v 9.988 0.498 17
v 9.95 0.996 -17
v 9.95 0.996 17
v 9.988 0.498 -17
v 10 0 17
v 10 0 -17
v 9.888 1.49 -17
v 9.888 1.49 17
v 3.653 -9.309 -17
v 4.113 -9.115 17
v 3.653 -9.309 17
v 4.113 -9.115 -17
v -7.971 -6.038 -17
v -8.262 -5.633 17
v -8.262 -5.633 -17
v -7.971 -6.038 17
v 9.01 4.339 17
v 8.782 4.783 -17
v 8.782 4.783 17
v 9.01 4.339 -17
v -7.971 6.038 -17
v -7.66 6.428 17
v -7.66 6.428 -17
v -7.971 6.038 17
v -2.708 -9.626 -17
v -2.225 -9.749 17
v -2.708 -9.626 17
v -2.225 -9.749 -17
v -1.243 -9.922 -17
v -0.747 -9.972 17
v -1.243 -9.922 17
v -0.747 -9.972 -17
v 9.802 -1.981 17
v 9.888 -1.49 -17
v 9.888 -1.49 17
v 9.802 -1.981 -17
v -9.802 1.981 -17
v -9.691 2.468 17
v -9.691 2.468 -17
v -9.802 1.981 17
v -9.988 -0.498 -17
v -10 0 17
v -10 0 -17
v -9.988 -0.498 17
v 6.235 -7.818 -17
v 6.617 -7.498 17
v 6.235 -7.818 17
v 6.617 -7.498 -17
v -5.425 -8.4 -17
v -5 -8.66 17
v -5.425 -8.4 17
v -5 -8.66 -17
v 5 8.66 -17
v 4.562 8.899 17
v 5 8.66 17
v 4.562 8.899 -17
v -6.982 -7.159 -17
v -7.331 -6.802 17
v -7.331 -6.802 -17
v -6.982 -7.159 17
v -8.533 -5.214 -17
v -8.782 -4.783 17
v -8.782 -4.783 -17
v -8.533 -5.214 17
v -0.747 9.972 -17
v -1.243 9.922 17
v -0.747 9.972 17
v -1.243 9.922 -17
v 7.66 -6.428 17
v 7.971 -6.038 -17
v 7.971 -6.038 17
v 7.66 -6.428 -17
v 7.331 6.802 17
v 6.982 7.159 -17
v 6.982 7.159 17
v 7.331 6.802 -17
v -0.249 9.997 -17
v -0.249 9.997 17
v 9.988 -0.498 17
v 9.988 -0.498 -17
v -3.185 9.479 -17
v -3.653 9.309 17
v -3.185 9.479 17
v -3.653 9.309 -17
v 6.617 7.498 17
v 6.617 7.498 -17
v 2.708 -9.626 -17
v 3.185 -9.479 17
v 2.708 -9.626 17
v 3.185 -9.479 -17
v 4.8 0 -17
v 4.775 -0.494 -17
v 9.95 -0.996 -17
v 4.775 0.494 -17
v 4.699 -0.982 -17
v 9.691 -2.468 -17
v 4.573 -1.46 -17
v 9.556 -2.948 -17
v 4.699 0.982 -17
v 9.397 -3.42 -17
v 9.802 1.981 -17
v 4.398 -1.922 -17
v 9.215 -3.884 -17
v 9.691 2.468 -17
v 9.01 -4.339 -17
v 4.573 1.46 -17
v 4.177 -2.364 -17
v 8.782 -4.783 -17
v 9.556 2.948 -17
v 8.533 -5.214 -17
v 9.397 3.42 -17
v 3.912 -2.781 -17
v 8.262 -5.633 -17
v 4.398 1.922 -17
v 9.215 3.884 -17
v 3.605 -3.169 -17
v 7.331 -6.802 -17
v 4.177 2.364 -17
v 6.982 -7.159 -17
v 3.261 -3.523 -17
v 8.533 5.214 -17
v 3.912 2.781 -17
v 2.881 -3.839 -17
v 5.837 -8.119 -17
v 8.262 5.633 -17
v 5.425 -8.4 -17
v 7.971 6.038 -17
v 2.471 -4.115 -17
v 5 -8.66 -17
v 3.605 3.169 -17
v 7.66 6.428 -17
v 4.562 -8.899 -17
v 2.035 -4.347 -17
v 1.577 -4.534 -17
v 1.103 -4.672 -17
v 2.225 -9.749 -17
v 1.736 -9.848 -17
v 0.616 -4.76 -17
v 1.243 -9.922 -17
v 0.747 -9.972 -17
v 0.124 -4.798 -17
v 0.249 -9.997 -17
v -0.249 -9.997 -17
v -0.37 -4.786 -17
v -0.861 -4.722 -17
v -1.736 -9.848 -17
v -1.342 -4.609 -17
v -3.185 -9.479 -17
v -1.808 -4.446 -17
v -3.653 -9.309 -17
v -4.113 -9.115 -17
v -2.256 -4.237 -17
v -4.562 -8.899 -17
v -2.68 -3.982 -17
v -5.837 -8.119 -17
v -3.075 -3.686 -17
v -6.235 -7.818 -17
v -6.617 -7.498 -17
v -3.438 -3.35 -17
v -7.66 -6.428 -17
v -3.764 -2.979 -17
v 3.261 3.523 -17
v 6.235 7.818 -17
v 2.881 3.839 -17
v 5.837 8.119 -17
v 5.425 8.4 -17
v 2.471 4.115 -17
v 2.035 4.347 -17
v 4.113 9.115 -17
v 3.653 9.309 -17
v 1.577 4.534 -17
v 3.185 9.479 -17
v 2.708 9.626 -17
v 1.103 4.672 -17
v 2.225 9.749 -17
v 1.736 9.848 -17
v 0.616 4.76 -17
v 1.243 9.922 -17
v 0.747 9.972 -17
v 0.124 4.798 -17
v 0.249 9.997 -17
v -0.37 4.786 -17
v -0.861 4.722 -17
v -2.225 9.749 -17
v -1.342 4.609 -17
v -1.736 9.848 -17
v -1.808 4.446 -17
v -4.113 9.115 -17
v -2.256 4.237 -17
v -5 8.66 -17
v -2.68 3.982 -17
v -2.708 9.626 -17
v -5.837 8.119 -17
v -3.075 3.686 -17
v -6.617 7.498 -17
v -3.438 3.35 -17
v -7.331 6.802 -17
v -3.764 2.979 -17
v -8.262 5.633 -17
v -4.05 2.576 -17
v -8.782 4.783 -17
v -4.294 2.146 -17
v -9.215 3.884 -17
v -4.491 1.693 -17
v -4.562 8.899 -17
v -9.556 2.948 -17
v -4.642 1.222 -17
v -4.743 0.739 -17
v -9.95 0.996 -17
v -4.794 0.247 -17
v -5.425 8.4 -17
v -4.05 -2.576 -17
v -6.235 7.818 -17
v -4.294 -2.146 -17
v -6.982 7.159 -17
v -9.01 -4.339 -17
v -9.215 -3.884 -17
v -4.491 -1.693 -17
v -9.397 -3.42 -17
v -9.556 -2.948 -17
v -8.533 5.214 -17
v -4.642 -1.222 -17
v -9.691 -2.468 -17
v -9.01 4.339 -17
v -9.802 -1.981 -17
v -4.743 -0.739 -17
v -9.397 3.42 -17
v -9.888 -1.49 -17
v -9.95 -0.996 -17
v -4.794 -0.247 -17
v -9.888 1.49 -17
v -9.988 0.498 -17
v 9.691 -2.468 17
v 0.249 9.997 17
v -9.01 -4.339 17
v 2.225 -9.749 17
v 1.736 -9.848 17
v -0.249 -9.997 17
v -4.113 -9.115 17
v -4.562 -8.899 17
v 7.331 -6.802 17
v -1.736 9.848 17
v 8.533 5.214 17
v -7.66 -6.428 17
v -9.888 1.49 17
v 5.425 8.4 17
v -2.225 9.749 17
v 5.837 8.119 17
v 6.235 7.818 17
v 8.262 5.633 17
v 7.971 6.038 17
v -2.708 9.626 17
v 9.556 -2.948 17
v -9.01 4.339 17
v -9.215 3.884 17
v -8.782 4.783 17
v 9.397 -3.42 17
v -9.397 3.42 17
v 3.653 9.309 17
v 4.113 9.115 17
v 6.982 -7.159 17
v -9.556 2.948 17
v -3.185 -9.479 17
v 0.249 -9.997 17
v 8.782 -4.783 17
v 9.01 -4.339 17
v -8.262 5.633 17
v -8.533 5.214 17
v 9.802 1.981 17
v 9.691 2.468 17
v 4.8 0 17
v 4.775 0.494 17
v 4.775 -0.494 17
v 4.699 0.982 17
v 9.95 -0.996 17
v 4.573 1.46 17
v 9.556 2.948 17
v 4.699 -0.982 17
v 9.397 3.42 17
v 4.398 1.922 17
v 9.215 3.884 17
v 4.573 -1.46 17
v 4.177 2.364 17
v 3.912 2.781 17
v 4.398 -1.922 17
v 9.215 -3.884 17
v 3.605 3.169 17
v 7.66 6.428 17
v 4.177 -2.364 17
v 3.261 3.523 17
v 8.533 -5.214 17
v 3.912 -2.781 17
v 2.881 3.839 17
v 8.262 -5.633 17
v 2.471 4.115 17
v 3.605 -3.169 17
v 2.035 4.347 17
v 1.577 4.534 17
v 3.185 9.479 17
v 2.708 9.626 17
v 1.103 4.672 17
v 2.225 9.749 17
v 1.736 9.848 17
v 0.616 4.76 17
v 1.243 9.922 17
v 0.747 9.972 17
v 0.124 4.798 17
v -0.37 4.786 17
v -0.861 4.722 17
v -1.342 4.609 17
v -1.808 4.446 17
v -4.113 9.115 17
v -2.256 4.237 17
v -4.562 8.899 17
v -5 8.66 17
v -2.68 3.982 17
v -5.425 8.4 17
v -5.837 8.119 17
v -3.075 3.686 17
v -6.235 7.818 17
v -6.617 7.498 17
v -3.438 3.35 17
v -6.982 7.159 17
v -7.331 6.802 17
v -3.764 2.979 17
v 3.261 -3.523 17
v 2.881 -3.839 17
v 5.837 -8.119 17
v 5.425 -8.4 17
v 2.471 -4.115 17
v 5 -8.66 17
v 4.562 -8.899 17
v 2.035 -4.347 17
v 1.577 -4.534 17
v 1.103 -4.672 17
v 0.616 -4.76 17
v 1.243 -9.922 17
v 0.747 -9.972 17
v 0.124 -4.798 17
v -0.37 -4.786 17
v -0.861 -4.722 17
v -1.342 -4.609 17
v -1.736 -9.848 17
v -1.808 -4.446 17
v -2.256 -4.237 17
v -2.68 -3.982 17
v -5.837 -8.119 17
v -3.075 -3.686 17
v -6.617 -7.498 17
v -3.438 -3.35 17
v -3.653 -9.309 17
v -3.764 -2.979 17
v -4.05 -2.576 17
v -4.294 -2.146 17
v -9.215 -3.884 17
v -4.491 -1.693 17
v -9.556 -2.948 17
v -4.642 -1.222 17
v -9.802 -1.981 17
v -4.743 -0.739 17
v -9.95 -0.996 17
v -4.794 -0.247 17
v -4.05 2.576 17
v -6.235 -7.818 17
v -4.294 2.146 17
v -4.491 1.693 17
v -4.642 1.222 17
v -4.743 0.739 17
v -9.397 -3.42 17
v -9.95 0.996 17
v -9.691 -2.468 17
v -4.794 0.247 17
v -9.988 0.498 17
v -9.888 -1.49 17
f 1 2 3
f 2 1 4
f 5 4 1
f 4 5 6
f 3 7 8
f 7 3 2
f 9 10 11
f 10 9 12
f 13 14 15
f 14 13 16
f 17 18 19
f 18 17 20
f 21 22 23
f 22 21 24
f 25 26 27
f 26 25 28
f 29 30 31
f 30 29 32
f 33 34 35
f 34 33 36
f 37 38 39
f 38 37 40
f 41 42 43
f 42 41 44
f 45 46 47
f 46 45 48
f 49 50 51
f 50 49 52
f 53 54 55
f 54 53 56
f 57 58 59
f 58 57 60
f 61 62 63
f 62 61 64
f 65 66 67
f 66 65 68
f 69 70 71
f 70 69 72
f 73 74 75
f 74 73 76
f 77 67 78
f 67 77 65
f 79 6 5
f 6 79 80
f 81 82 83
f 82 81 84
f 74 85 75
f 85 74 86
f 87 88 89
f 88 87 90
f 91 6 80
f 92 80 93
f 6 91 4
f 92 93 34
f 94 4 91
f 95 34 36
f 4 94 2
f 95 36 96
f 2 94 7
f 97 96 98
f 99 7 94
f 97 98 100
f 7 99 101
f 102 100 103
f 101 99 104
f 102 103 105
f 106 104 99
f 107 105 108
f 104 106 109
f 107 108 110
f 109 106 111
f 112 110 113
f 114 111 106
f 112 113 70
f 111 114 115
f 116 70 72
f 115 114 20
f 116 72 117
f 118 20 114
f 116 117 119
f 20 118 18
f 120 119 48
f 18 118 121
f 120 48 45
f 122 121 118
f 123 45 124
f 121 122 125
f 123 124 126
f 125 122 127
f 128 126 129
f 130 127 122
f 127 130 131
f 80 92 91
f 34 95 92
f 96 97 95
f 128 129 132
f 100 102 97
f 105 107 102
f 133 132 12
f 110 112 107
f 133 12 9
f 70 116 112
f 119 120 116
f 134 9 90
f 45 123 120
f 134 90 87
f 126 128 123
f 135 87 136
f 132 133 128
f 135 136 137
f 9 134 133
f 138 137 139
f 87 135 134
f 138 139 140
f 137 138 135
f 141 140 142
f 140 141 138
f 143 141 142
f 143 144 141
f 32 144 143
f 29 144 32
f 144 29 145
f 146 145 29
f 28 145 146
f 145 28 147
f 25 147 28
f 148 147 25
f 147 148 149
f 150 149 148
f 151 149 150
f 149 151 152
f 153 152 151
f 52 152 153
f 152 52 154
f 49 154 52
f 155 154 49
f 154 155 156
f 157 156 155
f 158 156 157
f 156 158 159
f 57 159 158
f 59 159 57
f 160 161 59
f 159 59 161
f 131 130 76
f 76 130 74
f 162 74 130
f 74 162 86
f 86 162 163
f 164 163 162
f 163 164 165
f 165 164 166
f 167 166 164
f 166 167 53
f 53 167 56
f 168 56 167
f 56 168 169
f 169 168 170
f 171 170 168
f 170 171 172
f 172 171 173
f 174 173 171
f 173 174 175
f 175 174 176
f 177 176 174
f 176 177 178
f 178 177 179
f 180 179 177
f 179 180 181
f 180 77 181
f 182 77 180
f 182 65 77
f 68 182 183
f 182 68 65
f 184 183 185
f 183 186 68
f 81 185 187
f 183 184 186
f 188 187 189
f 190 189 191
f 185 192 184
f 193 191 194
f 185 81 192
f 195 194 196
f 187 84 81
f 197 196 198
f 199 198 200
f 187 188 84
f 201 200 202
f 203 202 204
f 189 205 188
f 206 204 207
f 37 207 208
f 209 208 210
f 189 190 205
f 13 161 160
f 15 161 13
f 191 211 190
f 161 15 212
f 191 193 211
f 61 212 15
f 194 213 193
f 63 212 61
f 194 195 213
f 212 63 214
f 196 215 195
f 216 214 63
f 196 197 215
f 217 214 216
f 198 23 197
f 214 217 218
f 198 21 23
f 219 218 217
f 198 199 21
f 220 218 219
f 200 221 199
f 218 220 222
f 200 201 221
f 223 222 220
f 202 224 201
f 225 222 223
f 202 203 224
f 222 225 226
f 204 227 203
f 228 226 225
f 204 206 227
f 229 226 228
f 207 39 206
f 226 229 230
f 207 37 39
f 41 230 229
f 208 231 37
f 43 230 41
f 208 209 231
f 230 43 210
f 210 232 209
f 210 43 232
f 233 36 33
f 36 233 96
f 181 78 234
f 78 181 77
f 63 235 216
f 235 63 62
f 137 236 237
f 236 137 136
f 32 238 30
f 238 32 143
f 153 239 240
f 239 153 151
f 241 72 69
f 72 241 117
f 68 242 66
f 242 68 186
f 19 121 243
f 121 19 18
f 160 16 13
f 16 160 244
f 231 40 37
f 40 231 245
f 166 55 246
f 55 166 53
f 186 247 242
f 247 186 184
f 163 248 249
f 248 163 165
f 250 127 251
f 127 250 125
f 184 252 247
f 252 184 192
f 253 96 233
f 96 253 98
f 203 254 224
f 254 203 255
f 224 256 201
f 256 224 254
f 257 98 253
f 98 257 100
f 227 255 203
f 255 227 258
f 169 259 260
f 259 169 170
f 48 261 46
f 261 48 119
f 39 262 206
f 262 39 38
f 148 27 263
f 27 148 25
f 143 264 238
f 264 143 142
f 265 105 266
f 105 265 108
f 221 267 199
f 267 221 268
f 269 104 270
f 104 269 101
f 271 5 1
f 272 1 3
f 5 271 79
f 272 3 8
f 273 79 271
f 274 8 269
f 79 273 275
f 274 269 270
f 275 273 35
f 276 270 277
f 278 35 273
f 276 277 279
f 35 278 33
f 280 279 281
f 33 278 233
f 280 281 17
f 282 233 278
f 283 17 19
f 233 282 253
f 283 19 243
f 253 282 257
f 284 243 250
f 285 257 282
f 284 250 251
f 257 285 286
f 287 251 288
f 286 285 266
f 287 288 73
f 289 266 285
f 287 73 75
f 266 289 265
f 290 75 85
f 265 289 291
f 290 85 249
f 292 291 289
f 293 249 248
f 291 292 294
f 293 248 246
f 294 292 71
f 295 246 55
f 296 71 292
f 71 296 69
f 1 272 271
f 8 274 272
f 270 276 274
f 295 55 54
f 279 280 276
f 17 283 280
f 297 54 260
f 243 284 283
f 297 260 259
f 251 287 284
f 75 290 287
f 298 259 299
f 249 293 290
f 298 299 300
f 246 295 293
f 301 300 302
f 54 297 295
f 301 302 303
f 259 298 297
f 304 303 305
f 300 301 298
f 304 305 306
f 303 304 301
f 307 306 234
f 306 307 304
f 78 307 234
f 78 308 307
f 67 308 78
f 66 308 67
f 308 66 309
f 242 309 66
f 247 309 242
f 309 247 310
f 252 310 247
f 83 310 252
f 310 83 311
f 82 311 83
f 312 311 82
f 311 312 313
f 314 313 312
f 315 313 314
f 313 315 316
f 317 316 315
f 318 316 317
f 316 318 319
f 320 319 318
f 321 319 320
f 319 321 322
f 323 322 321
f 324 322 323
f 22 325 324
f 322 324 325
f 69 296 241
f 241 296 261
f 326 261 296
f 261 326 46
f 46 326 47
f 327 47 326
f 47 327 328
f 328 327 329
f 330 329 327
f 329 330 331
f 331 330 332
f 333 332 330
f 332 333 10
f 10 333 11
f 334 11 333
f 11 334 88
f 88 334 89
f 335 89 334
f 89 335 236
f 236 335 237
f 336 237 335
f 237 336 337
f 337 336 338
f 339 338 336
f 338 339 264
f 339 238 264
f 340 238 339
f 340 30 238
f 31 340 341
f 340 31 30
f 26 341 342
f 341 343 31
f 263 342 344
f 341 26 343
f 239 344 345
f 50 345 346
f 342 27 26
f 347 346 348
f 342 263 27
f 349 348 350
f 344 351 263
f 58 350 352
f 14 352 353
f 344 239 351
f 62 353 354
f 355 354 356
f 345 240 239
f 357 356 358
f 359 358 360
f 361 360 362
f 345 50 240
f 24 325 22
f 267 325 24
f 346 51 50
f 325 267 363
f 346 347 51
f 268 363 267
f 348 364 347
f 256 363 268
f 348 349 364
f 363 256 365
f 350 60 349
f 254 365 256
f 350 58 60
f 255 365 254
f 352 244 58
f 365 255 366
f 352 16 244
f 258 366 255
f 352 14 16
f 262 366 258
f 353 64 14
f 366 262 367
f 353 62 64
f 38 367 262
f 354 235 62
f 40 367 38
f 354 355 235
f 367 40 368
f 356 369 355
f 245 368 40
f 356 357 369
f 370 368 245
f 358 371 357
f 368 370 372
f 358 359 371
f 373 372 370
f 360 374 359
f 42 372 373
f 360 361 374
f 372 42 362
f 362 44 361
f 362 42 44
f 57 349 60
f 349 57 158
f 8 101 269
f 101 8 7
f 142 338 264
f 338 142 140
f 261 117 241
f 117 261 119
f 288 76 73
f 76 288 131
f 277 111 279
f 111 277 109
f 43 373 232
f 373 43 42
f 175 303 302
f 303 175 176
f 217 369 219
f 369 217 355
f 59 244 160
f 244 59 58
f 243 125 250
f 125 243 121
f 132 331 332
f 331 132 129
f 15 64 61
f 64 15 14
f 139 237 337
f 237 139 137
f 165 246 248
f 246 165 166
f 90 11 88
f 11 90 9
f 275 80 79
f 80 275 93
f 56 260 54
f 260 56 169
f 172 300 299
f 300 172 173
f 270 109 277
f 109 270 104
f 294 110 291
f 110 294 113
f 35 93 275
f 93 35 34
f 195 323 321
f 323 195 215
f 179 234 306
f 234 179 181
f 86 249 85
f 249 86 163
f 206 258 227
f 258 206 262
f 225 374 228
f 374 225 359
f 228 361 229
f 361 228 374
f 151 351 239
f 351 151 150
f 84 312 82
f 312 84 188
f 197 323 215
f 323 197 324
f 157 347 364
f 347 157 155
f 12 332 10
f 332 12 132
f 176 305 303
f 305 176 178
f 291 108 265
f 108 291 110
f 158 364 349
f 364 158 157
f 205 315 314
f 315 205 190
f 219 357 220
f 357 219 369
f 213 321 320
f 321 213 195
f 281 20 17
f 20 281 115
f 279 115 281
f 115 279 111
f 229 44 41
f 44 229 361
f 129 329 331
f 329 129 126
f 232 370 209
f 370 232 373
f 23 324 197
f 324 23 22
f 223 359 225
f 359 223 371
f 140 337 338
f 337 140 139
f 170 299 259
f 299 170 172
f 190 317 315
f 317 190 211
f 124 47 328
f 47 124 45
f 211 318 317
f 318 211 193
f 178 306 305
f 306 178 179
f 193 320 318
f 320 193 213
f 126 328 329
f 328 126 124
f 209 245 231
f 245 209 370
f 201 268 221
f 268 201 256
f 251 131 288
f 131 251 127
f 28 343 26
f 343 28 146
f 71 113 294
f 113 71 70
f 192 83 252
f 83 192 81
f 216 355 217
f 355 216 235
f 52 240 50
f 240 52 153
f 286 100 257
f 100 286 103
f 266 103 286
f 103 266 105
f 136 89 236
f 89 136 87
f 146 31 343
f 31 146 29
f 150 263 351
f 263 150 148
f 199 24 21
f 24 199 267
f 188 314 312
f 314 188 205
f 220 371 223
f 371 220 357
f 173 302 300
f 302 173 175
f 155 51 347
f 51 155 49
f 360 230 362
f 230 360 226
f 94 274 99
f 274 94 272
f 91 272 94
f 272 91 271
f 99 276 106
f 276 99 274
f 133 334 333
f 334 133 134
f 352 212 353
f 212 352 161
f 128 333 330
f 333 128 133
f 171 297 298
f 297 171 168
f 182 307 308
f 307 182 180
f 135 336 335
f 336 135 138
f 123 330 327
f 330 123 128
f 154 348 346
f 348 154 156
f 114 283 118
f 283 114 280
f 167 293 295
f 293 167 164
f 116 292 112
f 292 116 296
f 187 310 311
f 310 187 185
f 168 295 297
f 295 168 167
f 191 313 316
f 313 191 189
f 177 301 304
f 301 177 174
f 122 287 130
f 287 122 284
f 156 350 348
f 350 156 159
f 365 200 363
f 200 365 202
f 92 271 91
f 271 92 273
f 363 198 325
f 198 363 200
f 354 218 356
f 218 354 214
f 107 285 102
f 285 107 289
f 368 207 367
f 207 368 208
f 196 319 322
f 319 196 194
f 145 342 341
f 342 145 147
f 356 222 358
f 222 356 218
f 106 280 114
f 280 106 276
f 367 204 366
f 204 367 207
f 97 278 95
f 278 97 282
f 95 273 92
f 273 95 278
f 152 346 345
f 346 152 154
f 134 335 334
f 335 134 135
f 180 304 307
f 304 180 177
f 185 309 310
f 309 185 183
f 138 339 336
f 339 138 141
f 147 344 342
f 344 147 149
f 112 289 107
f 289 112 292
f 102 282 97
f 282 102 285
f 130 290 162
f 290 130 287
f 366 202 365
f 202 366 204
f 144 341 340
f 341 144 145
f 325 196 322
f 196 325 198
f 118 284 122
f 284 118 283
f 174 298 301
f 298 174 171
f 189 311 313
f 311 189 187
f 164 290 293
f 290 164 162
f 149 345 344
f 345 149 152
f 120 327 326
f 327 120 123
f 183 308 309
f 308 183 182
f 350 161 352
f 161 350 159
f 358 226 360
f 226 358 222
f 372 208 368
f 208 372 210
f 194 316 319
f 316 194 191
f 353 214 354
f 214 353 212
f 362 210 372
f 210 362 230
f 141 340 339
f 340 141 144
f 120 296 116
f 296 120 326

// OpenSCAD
//Adaptador 20mm para 9,60mm por 20mm de altura
$fa=1; 
$fs=0.5;

module adaptador(){
    difference (){
        cylinder ( r = 10 , h = 17 * 2 , center = true);
        #cylinder ( r = 9.6 / 2 , h = 17*2+2 , center = true) ;
    }
}

adaptador();
